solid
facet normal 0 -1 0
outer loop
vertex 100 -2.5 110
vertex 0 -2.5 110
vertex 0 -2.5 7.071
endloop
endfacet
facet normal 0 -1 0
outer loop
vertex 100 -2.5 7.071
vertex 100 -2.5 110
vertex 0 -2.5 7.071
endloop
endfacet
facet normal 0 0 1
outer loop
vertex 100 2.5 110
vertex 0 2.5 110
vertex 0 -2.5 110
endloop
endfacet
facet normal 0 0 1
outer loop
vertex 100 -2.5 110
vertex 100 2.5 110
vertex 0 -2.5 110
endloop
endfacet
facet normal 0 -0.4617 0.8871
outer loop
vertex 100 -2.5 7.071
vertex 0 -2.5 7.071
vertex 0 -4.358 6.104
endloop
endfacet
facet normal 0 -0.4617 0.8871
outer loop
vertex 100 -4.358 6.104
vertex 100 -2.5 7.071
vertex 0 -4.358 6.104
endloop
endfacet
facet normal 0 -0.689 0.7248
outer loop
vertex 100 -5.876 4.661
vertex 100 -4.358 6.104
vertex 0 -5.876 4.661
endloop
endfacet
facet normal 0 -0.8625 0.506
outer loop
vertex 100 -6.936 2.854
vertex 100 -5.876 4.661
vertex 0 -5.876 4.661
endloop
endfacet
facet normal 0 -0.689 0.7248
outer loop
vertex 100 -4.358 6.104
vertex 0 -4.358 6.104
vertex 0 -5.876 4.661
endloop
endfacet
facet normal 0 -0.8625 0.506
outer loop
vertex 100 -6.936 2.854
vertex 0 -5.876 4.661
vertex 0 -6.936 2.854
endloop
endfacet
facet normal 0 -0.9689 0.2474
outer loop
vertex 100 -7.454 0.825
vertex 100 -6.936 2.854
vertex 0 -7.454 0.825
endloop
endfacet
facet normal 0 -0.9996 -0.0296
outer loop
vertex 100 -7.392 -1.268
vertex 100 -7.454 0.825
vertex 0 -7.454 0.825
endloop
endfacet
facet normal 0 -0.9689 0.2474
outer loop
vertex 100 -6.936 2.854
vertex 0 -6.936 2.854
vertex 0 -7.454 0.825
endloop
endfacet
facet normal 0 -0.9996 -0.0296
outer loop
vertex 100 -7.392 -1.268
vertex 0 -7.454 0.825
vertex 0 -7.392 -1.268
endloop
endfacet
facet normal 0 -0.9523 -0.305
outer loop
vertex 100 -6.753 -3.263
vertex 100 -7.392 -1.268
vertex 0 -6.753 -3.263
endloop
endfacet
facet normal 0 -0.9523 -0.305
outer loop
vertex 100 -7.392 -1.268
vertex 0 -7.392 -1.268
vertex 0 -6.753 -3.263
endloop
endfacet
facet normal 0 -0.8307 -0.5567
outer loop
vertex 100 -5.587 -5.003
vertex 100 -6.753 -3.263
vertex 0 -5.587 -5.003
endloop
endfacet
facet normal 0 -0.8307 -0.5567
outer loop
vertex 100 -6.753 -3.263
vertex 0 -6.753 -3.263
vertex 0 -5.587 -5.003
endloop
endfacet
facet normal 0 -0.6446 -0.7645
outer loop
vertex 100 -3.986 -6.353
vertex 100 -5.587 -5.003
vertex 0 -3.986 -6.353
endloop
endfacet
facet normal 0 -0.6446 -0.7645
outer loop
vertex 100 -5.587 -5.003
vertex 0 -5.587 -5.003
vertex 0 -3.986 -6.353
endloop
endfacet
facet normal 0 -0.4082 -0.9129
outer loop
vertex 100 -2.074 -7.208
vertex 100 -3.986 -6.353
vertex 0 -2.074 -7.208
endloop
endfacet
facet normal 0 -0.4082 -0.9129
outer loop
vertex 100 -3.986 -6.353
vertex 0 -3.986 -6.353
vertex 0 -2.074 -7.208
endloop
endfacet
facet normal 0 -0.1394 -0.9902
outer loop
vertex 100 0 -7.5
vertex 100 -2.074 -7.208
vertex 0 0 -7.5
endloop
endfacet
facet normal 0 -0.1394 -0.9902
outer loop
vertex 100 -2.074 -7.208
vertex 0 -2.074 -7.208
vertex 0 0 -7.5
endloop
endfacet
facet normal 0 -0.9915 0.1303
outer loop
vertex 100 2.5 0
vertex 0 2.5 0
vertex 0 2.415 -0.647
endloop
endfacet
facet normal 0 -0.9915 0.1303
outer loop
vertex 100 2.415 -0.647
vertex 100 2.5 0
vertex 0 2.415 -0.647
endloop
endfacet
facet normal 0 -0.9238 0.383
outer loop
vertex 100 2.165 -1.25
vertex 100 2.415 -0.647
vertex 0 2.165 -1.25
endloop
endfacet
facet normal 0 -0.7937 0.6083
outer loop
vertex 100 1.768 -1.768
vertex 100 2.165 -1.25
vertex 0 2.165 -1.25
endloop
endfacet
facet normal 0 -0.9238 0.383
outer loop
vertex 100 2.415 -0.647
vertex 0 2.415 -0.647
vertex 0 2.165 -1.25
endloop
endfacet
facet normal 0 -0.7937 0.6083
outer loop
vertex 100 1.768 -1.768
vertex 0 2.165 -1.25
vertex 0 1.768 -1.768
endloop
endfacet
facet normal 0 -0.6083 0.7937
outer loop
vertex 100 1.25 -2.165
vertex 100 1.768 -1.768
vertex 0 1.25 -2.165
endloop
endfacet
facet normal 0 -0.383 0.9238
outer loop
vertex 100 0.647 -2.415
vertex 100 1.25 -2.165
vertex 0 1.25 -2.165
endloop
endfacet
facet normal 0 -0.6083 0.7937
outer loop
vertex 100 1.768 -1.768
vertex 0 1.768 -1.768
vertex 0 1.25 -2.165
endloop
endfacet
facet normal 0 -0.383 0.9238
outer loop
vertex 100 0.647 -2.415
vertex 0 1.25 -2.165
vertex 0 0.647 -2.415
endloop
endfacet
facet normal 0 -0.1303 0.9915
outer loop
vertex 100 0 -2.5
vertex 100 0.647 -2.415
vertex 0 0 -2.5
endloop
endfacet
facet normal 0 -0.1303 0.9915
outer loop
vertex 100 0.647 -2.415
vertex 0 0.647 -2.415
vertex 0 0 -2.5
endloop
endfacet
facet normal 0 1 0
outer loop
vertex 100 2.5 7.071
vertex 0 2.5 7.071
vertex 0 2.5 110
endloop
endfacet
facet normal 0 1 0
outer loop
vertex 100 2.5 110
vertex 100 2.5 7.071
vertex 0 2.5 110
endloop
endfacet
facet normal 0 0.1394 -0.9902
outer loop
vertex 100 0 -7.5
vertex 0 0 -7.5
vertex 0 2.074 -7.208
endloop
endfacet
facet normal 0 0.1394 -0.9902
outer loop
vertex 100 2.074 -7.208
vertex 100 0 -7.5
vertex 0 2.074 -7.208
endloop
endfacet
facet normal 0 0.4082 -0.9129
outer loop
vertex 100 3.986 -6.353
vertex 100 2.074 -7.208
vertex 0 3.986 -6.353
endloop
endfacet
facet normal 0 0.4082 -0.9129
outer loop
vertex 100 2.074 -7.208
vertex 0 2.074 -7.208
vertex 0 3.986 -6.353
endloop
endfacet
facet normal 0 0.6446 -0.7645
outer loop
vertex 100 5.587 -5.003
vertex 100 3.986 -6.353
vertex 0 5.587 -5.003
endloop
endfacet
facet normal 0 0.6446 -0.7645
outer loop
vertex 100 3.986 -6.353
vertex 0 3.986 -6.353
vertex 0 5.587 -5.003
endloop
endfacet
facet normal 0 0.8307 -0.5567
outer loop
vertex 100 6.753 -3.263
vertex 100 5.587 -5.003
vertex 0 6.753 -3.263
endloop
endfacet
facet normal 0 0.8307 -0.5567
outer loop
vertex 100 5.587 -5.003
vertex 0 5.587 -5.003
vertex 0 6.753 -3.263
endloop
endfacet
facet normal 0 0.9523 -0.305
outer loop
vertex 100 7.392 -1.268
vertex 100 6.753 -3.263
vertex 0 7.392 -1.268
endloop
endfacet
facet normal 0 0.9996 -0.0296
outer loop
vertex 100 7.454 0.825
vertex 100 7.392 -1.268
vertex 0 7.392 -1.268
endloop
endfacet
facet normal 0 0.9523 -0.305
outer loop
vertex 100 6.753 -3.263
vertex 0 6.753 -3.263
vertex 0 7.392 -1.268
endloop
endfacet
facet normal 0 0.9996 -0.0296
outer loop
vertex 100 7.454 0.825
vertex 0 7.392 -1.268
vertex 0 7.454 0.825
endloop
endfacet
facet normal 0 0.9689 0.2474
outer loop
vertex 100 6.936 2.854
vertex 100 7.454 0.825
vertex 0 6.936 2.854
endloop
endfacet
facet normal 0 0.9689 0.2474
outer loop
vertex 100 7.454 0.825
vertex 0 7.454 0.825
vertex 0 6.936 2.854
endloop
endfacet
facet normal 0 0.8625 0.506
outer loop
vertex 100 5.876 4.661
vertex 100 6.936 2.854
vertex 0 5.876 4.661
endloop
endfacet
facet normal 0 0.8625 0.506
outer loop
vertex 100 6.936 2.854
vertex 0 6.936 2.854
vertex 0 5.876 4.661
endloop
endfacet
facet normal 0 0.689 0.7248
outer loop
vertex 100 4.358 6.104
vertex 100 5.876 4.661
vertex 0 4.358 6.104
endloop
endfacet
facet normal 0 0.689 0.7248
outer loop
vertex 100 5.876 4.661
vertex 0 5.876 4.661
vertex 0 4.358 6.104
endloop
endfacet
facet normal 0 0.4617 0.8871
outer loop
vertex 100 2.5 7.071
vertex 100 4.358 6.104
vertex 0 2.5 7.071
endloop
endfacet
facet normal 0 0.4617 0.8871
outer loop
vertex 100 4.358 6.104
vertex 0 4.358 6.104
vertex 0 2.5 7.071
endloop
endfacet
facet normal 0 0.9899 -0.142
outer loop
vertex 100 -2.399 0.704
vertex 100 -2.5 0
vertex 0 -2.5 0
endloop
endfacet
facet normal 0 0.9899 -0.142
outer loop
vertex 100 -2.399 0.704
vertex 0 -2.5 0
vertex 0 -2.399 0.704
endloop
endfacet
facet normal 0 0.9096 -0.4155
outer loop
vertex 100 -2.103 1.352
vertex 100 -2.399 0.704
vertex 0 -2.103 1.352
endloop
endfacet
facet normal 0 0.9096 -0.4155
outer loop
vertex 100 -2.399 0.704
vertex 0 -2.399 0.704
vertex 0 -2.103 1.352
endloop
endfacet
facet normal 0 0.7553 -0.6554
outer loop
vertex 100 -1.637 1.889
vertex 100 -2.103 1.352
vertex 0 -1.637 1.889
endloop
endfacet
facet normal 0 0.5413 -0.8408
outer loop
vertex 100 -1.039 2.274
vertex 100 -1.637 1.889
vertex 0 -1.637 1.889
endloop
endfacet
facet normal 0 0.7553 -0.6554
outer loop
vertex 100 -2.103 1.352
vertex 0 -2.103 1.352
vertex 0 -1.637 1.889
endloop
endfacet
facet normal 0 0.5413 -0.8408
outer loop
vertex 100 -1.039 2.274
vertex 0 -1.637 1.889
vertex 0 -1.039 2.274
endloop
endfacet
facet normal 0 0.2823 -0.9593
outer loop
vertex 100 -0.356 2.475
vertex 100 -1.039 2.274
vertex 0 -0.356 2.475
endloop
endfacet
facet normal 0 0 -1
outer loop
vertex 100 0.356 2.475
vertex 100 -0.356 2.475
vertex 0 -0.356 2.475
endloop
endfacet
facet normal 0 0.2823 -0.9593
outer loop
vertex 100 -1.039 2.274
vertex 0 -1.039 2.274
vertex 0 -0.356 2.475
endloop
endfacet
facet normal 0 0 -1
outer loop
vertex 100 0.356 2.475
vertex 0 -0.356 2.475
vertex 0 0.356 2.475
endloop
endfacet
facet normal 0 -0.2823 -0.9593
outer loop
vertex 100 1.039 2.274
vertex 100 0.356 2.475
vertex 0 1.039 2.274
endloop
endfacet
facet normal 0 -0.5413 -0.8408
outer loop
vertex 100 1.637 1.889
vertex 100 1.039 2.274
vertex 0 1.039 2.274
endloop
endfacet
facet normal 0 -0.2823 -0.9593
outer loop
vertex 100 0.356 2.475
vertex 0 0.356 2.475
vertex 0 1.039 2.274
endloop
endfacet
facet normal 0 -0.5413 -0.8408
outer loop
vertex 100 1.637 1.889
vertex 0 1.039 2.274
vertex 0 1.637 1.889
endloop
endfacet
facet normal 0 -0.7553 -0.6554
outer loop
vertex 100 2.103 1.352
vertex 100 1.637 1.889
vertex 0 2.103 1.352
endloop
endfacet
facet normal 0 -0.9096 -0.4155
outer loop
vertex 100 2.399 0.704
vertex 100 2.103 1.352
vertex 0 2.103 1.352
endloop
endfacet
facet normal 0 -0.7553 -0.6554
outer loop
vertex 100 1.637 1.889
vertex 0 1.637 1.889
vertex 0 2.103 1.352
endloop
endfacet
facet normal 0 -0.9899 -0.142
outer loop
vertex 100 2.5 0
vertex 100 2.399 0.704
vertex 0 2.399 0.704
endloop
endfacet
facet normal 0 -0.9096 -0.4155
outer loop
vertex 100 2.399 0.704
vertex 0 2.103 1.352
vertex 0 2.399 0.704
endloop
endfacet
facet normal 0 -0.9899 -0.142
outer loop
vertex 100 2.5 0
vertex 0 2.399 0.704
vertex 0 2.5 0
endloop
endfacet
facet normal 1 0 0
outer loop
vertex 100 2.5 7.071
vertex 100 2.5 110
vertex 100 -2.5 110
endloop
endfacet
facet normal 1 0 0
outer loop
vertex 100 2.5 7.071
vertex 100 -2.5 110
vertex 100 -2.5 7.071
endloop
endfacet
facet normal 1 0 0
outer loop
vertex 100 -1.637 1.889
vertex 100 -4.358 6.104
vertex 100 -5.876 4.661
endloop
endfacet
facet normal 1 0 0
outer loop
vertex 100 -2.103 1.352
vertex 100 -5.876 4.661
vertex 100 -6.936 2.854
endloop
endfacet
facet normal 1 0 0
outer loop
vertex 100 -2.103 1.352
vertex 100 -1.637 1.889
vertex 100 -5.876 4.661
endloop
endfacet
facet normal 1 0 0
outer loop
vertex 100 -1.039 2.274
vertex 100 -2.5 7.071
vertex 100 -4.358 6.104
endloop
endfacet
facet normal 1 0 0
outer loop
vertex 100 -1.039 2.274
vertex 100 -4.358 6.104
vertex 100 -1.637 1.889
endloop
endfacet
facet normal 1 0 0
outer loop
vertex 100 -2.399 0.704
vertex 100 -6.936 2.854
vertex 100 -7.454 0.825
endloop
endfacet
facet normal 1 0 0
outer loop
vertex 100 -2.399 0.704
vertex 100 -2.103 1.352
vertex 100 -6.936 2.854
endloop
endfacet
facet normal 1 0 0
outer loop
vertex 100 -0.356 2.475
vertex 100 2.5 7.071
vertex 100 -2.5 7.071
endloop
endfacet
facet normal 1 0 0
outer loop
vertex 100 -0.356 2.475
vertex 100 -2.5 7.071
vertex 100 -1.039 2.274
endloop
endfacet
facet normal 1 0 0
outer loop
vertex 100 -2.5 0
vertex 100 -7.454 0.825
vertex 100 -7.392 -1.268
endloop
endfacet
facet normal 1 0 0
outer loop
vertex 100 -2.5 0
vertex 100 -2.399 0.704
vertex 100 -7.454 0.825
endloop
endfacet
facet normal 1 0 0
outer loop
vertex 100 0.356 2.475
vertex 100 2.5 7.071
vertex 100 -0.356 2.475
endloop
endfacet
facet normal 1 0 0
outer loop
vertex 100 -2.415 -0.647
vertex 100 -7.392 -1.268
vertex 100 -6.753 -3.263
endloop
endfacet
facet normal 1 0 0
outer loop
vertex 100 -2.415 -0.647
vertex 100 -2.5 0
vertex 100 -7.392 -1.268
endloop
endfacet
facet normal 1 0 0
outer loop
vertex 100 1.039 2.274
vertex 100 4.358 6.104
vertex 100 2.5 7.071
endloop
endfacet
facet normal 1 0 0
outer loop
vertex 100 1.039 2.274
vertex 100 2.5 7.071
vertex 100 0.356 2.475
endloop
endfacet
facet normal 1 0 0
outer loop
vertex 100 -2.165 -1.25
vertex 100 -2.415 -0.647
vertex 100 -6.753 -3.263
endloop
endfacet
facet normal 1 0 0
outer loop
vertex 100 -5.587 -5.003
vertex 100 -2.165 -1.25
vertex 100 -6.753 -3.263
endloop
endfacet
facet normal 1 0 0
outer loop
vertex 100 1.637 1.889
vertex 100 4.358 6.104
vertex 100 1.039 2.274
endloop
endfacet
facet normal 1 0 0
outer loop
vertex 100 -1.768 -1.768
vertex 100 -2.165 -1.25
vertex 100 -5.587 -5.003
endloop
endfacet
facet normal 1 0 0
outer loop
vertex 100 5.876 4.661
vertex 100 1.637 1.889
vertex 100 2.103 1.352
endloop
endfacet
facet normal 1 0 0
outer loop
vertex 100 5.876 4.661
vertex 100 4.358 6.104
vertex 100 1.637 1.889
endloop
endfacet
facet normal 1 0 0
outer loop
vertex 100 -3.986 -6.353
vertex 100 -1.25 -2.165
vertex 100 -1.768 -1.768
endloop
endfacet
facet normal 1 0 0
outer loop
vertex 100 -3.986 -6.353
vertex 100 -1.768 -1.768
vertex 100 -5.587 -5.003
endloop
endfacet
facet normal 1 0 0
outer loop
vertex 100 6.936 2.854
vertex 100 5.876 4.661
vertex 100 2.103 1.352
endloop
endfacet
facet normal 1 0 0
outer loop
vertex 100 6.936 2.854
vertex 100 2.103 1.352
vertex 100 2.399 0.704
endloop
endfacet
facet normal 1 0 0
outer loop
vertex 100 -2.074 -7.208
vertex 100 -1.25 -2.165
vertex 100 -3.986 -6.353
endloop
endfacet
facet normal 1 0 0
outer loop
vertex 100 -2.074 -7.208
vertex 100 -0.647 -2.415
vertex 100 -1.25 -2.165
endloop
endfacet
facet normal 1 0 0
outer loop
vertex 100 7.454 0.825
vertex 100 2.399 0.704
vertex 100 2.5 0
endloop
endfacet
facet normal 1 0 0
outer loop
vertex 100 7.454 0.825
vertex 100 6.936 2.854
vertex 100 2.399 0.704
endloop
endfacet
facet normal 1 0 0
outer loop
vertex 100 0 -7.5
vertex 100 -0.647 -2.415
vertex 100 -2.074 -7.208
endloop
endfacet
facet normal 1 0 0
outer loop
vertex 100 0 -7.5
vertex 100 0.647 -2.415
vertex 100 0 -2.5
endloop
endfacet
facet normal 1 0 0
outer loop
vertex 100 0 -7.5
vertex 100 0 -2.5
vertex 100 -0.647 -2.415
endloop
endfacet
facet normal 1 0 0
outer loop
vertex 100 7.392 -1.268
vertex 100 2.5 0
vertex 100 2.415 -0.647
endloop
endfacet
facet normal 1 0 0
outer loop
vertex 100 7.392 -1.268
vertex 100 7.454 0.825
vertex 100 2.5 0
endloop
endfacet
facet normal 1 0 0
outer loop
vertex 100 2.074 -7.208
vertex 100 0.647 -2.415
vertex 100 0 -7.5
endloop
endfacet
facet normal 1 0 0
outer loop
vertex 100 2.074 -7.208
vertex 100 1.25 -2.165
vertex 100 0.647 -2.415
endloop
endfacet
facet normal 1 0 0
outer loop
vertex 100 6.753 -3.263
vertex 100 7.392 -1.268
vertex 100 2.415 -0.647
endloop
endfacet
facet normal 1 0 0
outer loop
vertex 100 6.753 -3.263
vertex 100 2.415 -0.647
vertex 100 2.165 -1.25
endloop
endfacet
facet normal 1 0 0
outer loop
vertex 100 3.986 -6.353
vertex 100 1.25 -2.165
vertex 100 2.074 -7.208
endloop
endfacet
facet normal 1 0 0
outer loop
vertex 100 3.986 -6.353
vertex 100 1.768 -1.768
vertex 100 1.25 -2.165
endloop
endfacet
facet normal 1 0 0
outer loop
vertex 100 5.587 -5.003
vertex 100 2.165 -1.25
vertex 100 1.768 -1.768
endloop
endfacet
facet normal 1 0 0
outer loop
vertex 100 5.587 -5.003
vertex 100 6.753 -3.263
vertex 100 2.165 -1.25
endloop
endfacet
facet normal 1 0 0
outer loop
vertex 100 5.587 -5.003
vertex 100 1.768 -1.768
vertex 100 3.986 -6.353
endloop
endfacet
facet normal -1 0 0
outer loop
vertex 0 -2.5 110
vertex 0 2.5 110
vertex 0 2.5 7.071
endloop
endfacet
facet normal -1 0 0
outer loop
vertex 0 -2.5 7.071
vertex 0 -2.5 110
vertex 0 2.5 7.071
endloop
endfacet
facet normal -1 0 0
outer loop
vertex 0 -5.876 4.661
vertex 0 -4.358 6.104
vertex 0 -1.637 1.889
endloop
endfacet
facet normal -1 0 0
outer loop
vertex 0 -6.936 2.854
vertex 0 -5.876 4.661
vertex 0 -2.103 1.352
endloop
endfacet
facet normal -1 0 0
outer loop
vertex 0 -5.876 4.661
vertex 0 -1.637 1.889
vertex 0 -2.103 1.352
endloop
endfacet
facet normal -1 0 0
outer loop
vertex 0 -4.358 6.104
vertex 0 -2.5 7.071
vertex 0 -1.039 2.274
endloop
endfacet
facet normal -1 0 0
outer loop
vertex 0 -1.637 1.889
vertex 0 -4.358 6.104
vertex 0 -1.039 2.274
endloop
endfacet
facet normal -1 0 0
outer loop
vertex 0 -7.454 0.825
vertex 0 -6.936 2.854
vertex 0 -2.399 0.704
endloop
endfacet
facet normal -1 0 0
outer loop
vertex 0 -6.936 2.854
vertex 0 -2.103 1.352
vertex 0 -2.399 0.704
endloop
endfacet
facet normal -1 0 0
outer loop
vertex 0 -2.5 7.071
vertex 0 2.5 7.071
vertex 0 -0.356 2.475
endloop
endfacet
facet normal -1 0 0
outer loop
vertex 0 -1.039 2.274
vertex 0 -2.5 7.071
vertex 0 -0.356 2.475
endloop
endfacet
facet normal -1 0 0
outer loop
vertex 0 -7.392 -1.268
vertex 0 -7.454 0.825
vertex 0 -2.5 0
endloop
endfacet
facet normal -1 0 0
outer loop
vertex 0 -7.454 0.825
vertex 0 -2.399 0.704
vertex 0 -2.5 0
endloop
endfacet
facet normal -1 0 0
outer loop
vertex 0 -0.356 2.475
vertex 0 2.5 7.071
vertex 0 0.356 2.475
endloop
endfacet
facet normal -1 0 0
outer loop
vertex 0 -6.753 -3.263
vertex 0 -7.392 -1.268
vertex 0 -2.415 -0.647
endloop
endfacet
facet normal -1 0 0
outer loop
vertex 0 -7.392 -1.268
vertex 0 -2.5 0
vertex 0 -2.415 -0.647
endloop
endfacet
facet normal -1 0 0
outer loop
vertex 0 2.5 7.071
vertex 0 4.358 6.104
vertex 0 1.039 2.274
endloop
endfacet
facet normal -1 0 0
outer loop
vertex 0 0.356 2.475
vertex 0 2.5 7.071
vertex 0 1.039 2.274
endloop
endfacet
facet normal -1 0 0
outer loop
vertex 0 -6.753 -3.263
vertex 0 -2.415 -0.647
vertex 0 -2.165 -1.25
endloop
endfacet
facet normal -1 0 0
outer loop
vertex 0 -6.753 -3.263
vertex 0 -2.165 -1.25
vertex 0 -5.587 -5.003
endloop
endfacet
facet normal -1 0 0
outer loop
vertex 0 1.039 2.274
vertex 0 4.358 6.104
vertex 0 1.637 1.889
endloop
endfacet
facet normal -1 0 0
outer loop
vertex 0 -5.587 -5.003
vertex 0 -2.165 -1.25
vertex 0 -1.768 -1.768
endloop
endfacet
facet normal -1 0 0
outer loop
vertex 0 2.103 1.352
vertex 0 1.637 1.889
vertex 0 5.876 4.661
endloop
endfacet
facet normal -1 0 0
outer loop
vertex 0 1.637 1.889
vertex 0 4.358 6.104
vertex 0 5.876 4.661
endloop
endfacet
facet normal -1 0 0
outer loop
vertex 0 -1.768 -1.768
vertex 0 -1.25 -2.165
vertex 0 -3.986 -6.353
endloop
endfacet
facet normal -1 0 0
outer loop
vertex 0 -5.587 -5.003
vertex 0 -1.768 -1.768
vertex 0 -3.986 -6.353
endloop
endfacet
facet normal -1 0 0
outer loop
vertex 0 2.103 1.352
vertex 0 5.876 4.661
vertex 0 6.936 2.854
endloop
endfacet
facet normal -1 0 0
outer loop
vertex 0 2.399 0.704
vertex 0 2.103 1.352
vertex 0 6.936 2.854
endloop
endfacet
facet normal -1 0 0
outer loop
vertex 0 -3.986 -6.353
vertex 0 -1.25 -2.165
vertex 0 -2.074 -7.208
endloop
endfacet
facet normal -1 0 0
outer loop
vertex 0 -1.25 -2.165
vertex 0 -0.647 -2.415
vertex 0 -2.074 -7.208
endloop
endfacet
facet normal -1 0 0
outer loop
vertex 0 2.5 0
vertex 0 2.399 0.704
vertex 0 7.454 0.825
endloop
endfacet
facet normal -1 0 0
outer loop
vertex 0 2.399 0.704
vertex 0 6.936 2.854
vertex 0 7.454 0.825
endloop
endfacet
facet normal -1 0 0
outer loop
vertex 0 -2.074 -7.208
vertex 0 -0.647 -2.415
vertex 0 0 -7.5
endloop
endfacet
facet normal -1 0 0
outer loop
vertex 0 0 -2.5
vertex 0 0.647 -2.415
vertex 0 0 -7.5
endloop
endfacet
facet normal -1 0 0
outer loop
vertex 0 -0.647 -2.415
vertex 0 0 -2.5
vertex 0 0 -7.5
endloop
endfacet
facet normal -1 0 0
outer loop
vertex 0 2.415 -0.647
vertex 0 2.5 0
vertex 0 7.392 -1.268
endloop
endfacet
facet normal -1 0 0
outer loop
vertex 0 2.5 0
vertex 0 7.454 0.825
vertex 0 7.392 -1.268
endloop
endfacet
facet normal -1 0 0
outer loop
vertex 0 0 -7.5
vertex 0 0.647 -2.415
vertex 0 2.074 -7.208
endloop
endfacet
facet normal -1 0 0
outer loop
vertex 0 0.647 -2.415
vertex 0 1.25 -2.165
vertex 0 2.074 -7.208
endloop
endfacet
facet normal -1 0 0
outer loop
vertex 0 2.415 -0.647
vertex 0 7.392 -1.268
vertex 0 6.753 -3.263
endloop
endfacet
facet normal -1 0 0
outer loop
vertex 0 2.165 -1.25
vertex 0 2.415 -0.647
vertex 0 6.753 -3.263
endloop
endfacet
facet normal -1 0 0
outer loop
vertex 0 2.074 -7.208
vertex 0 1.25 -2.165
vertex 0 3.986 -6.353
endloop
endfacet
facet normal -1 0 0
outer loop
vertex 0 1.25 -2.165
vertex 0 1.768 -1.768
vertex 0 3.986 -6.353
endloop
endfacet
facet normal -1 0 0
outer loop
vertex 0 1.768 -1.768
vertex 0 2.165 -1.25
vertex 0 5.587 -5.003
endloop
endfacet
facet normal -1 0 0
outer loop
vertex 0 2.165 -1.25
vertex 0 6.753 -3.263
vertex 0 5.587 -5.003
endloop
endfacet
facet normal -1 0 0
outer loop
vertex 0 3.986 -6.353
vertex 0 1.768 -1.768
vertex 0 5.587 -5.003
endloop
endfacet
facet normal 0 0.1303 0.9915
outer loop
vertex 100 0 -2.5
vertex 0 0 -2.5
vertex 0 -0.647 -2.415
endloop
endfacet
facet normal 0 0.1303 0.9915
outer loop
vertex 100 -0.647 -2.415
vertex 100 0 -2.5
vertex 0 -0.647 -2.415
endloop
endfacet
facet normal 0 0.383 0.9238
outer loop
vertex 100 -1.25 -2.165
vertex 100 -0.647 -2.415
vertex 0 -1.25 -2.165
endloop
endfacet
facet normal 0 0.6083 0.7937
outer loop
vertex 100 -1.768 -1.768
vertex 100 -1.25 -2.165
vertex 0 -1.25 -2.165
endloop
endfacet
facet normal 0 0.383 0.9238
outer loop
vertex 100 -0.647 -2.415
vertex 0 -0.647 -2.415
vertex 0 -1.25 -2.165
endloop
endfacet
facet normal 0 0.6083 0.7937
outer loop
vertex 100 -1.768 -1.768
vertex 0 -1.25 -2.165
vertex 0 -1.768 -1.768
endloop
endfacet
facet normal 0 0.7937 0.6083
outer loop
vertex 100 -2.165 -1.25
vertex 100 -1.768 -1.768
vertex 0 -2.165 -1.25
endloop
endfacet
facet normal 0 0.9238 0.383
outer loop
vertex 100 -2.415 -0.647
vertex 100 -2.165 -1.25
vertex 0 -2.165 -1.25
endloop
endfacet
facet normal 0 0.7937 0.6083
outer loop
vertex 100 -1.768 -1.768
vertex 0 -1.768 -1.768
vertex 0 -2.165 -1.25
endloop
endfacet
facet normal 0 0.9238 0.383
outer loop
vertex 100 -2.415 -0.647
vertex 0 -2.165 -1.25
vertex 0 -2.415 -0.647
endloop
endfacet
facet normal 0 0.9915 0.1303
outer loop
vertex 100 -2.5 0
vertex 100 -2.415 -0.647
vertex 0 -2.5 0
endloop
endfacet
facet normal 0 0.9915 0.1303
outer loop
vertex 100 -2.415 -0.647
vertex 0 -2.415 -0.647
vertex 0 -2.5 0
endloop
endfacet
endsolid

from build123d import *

# Parameters (mm, degrees)
BOSS_EXTRUDE1_DEPTH = 100


with BuildPart() as part:
    # Sketch1 → Boss-Extrude1 (new body)
    with BuildSketch(Plane(origin=(0, 0, 0), x_dir=(0, 0, -1), z_dir=(1, 0, 0))):
        with BuildLine():
            ThreePointArc((0, -2.5), (-2.5, 0), (0, 2.5))
            Line((0, 2.5), (-7.071067812, 2.5))
            ThreePointArc((-7.071067812, 2.5), (-7.5, 0), (-7.071067812, -2.5))
            Line((-7.071067812, -2.5), (0, -2.5))
        make_face()
        with BuildLine():
            Line((-7.071067812, 2.5), (0, 2.5))
            ThreePointArc((0, 2.5), (1.767766953, 1.767766953), (2.5, 0))
            ThreePointArc((2.5, 0), (1.767766953, -1.767766953), (0, -2.5))
            Line((0, -2.5), (-7.071067812, -2.5))
            ThreePointArc((-7.071067812, -2.5), (1.26826484, -7.391989197), (7.5, 0))
            ThreePointArc((7.5, 0), (1.26826484, 7.391989197), (-7.071067812, 2.5))
        make_face()
        with BuildLine():
            ThreePointArc((-7.071067812, -2.5), (-7.5, 0), (-7.071067812, 2.5))
            Line((-7.071067812, 2.5), (-110, 2.5))
            Line((-110, 2.5), (-110, -2.5))
            Line((-110, -2.5), (-7.071067812, -2.5))
        make_face()
    extrude(amount=BOSS_EXTRUDE1_DEPTH)


solid = part.part
